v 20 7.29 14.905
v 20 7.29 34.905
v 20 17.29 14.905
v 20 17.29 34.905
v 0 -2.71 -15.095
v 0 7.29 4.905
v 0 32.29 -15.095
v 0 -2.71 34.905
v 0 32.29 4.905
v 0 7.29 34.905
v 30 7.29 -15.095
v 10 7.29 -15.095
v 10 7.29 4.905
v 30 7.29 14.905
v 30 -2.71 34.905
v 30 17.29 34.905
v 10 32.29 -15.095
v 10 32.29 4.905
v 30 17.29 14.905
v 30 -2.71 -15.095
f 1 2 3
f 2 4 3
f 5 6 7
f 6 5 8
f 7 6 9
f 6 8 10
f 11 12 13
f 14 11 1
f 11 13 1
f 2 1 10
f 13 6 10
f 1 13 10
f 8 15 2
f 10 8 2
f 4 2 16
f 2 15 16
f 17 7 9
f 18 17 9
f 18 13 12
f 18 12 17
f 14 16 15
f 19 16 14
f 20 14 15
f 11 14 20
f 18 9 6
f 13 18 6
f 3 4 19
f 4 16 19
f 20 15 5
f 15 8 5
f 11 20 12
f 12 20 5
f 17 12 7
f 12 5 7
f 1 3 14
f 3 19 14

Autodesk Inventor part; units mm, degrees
ref_plane "YZ Plane" through (0, 0, 0) normal (1, 0, 0) x (0, 1, 0)
ref_plane "XZ Plane" through (0, 0, 0) normal (0, 1, 0) x (-1, 0, 0)
ref_plane "XY Plane" through (0, 0, 0) normal (0, 0, 1) x (1, 0, 0)
sketch "Sketch1" plane through (0, 0, 0) normal (1, 0, 0) x (0, 1, 0)
  line L0 (-2.71, -15.0951) -> (7.29, -15.0951)
  line L1 (7.29, -15.0951) -> (7.29, 34.9049)
  line L2 (7.29, 34.9049) -> (-2.71, 34.9049)
  line L3 (-2.71, 34.9049) -> (-2.71, -15.0951)
  point P0 (0, 0)
  dimension "d0" = 50
  dimension "d1" = 10
extrude "Extrusion1" add sketch "Sketch1" along normal blind 30
sketch "Sketch2" plane through (0, 0, 0) normal (1, 0, 0) x (0, 1, 0)
  line L0 (7.29, -15.0951) -> (7.29, 34.9049) projected
  line L1 (7.29, -15.0951) -> (32.29, -15.0951)
  line L2 (32.29, -15.0951) -> (32.29, 4.9049)
  line L3 (32.29, 4.9049) -> (7.29, 4.9049)
  point P0 (0, 0)
  dimension "d4" = 25
  dimension "d5" = 20
extrude "Extrusion2" add sketch "Sketch2" along normal blind 10
sketch "Sketch3" plane through (30, 0, 0) normal (1, 0, 0) x (0, 0, -1)
  line L0 (-34.9049, 7.29) -> (-34.9049, -2.71) projected
  line L1 (-34.9049, 7.29) -> (-34.9049, 17.29)
  line L2 (-34.9049, 17.29) -> (-14.9049, 17.29)
  line L3 (-14.9049, 17.29) -> (-14.9049, 7.29)
  line L4 (15.0951, 7.29) -> (-34.9049, 7.29) projected
  line L5 (-14.9049, 7.29) -> (-34.9049, 7.29)
  point P0 (0, 0)
  dimension "d8" = 20
  dimension "d9" = 10
extrude "Extrusion3" add sketch "Sketch3" against normal blind 10
properties part number "BT004_Formstück"
